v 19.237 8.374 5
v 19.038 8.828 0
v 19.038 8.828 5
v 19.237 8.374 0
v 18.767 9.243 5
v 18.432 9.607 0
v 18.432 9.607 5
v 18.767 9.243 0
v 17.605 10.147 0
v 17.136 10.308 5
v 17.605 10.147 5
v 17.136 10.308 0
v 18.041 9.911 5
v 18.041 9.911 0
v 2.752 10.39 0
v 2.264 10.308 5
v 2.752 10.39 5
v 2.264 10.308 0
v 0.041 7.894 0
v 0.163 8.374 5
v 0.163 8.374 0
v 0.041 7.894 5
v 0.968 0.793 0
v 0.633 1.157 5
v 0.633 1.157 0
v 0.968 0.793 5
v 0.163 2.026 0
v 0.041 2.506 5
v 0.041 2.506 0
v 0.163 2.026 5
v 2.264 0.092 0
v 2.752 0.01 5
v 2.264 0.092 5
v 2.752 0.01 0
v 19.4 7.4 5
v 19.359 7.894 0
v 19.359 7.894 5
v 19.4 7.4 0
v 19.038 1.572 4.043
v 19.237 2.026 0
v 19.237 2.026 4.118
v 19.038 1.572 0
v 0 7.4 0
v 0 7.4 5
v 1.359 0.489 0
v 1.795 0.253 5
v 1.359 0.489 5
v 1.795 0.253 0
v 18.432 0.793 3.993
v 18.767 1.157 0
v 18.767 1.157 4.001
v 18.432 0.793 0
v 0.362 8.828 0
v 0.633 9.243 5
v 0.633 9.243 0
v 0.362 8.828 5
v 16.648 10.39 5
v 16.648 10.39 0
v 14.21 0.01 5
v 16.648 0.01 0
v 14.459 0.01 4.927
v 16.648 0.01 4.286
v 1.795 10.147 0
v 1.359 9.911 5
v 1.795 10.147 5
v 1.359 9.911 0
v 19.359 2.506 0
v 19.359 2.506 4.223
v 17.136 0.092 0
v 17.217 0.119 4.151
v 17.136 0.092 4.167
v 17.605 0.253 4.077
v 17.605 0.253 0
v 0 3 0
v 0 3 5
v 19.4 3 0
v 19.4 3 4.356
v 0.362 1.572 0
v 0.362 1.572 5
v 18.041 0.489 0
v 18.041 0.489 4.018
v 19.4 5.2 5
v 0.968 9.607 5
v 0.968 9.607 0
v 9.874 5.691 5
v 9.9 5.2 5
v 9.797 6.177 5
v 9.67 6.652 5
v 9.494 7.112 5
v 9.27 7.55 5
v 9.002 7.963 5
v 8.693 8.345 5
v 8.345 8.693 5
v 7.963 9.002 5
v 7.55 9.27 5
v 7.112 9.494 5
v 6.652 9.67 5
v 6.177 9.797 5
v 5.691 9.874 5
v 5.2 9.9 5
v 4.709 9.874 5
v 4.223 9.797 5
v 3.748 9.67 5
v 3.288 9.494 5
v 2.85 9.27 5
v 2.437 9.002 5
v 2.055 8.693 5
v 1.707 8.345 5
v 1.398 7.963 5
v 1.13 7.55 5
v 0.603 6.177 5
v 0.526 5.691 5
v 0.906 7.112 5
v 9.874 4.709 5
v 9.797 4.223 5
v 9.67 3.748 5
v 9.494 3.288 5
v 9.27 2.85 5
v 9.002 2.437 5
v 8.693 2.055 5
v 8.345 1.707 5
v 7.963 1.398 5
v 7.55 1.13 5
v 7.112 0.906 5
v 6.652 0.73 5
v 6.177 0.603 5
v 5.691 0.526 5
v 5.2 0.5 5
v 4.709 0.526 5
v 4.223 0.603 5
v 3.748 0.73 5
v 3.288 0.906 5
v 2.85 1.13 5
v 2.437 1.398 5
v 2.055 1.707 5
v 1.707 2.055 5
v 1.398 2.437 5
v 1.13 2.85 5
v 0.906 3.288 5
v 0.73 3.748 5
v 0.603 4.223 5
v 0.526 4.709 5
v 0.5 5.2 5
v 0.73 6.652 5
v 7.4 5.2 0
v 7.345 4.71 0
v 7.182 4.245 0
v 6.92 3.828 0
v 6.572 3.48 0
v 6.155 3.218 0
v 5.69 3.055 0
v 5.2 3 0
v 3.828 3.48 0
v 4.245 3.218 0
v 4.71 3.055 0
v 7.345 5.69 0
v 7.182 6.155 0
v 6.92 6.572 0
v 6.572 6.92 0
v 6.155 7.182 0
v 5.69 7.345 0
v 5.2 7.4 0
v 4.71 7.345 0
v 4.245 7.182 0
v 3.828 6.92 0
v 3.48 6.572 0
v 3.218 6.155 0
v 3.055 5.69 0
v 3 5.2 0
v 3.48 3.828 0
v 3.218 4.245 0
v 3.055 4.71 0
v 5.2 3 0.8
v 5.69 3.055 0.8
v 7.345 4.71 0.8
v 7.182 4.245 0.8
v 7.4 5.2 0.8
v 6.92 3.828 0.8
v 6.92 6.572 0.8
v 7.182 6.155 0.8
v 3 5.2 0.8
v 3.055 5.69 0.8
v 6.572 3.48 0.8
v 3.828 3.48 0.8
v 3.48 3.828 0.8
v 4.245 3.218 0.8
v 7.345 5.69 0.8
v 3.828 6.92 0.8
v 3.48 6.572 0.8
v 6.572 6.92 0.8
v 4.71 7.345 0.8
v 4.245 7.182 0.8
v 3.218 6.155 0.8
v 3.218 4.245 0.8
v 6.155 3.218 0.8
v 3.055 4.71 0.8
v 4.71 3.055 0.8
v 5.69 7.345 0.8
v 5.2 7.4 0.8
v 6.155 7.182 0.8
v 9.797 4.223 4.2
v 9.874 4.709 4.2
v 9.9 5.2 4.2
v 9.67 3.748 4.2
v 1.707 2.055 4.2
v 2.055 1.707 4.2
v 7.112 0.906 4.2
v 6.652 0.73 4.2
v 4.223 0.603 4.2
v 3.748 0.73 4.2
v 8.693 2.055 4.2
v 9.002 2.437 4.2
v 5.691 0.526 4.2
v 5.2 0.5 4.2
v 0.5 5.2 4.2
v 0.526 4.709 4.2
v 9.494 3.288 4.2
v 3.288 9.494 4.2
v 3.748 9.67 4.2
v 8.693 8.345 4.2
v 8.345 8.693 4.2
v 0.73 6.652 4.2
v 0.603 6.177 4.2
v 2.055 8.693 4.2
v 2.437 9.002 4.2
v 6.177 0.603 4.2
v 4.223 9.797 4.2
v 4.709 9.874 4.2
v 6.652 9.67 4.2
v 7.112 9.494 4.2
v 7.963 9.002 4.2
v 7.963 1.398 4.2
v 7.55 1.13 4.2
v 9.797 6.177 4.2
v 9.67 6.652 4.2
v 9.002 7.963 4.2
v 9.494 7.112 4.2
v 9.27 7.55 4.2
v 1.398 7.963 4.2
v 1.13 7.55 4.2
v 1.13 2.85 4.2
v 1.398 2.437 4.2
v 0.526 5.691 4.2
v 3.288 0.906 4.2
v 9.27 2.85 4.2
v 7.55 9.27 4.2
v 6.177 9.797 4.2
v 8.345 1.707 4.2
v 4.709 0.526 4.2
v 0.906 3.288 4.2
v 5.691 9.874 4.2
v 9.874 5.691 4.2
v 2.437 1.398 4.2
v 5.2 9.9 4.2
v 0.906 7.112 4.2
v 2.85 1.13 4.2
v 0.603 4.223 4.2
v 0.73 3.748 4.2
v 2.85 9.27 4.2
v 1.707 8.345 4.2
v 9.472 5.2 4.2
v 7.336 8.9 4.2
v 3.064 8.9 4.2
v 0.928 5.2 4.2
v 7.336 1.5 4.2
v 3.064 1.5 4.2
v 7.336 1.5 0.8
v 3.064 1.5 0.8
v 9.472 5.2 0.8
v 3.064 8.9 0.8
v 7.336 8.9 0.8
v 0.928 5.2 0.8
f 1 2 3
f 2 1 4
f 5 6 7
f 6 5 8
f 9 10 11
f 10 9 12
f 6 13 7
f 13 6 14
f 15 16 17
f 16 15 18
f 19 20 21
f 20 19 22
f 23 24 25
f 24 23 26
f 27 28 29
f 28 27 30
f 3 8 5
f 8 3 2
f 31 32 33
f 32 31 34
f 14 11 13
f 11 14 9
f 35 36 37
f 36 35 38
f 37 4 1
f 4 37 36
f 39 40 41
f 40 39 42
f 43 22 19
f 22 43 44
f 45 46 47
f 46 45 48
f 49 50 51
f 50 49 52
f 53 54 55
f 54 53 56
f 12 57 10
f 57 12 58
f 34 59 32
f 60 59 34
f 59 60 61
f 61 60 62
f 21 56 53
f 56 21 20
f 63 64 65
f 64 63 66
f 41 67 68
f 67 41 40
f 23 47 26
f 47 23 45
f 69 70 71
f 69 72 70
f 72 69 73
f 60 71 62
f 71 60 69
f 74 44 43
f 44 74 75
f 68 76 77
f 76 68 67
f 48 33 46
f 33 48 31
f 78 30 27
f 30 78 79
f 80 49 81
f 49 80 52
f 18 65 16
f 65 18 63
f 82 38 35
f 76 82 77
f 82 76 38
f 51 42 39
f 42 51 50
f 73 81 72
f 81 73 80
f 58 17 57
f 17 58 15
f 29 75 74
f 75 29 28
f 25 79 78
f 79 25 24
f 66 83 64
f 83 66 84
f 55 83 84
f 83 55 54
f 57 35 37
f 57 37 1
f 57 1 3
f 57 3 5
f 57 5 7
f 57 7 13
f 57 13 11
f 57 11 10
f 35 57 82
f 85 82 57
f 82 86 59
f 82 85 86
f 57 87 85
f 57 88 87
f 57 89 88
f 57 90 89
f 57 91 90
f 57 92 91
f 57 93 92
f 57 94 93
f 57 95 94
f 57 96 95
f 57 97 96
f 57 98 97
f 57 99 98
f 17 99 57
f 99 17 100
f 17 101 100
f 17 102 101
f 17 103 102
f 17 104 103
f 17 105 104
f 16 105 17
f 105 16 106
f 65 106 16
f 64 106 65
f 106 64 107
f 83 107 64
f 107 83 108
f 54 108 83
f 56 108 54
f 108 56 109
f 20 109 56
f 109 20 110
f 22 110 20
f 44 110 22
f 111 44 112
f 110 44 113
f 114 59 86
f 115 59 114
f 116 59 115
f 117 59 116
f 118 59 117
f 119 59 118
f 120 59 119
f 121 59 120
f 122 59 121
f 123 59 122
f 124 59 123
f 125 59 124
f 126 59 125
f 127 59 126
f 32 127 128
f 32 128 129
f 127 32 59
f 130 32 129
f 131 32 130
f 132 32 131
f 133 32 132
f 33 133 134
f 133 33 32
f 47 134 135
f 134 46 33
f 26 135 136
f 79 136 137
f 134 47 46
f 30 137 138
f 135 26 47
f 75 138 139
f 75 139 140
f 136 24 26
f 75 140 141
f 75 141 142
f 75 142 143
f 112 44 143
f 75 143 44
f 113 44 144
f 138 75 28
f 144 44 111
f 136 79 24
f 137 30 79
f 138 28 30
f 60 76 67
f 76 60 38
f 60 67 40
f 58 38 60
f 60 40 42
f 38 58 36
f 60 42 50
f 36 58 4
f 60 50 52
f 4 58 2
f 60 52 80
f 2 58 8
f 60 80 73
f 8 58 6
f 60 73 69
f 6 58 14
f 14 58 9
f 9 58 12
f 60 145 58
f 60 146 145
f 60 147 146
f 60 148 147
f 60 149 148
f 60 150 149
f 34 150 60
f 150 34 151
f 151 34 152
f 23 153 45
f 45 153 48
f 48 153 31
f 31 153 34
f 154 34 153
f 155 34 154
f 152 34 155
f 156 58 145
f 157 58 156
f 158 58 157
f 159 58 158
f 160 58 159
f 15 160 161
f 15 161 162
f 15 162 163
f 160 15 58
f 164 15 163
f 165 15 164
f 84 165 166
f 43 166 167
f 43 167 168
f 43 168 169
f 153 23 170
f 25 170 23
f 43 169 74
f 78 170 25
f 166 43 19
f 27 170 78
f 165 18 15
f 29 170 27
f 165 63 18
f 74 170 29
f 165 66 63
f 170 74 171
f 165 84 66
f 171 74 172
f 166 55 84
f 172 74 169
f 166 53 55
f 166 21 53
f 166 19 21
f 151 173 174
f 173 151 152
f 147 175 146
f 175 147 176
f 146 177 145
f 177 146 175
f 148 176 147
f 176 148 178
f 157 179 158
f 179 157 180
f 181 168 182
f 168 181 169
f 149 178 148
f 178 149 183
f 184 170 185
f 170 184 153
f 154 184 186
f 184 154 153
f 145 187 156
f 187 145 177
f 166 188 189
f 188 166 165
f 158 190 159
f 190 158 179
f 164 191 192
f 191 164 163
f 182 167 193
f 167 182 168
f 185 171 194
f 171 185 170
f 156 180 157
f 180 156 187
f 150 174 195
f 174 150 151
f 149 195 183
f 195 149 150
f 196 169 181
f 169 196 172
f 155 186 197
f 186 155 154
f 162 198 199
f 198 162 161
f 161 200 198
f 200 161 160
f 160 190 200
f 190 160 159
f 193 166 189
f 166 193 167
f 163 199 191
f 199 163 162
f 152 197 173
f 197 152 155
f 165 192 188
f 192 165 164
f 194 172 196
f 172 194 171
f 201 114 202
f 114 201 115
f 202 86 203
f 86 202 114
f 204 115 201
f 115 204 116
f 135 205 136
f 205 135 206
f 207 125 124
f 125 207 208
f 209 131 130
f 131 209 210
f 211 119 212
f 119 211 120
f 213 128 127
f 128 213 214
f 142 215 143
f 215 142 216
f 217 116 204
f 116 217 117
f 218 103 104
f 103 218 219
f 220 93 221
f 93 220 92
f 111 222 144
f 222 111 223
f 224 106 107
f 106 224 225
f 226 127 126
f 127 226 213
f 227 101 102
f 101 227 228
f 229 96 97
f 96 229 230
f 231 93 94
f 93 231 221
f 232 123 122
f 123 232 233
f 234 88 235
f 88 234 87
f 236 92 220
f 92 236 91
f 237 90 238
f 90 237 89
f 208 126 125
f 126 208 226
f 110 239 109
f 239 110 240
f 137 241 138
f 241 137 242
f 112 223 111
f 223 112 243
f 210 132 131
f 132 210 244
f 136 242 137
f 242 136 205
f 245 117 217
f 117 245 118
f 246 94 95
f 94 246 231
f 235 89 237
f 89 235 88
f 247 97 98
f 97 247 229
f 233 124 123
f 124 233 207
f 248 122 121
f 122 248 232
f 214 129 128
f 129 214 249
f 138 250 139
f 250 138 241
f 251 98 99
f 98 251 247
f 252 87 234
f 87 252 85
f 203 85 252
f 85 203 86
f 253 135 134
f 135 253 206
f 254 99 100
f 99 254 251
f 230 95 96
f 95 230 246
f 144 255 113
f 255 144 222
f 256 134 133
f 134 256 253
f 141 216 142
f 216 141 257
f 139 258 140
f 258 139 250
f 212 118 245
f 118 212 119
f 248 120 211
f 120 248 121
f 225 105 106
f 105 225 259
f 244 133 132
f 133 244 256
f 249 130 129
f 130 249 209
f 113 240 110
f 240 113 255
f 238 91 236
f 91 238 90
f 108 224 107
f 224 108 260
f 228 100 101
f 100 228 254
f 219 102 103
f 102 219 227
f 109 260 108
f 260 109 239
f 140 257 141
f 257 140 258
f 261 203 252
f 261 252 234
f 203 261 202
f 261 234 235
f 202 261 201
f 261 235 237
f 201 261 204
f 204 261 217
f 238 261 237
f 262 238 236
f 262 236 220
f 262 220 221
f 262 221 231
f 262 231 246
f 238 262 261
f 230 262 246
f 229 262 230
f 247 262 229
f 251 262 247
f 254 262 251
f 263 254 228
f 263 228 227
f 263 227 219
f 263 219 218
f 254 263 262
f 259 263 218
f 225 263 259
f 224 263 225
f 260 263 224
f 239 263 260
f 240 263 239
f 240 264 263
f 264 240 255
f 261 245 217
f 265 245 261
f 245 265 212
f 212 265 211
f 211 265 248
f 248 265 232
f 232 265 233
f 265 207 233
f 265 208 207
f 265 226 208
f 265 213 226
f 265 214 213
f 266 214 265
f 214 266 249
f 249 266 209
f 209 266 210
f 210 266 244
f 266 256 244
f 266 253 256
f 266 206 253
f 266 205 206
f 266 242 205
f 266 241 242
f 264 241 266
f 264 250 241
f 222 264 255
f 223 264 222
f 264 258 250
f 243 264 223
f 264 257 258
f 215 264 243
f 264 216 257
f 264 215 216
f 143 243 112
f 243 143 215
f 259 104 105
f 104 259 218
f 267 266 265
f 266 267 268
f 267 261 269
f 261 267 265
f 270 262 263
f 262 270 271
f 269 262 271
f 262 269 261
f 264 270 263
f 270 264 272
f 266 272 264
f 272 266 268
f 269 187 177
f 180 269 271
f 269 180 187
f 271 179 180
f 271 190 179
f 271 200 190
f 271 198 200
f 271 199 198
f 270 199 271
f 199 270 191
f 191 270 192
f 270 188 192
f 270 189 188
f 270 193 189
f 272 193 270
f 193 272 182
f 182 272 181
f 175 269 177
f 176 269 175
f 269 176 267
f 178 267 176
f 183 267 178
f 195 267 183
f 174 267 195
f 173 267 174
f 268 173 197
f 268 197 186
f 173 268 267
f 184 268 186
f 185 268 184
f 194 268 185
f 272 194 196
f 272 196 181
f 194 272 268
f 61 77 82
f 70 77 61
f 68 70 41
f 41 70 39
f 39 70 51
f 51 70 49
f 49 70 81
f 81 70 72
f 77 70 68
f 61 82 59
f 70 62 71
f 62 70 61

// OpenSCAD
// file: functions.scad
/*******************************************************************

This OpenSCAD code and its rendered 3D model are part of the

	Kühling&Kühling RepRap Industrial 3D Printer


All details, BOM, assembling instructions and latest sources:
	http://kuehlingkuehling.de

Designed and developed by:
	Jonas Kühling <mail@jonaskuehling.de>
	Simon Kühling <mail@simonkuehling.de>

Licensed under:
	Creative Commons Attribution-ShareAlike
	CC BY-SA 3.0
	http://creativecommons.org/licenses/by-sa/3.0/

*******************************************************************/

module teardrop (r=4.5,h=20,alpha=45,teardropcorner=0,fulldrop=0){		// tear drop hole for top-centering
											// use teardropcorner=1 for bottom horizontal corners
	render()
	translate([-h/2,0,0])
		rotate([-270,0+(teardropcorner*180),90])
			difference(){
				linear_extrude(height=h){
					circle(r);
					polygon(points=[[0,0],[r*cos(alpha),r*sin(alpha)],[0,r/sin(alpha)],[-r*cos(alpha),r*sin(alpha)]], paths=[[0,1,2,3]]);
				}
				if(fulldrop==0) 
					translate([0,(r/sin(alpha))/2+r,h/2]) cube([2*r+2,r/sin(alpha),h+2],center=true);
			}
}

//teardrop(4.5,22,fulldrop=true);



module teardropcentering (r=4.5,h=20,alpha=45){				// tear drop hole for top-centering
	centering_offset_factor = 1.1;
	render()
	translate([-h/2,0,0])
		rotate([-270,0,90])
			difference(){
				linear_extrude(height=h){
					circle(r, $fn=24);
					polygon(points=[[0,0],[r*cos(alpha),r*sin(alpha)],[0,r/sin(alpha)],[-r*cos(alpha),r*sin(alpha)]], paths=[[0,1,2,3]]);
				}
				translate([0,(r/sin(alpha))/2+r*centering_offset_factor,h/2]) cube([2*r+2,r/sin(alpha),h+2],center=true);
			}
}

//teardropcentering();



module teardropcentering_half (r=4.5,h=20, bottom=0,alpha=45){				// tear drop hole for top-centering
																// upper half (bottom=0) or bottom half (bottom=1)
	centering_offset_factor = 1.2;
	render()
	translate([-h/2,0,0])
		rotate([-270,0,90])
			difference(){
				linear_extrude(height=h){
					circle(r, $fn=24);
					polygon(points=[[0,0],[r*cos(alpha),r*sin(alpha)],[0,r/sin(alpha)],[-r*cos(alpha),r*sin(alpha)]], paths=[[0,1,2,3]]);
				}
				translate([0,(r/sin(alpha))/2+r*centering_offset_factor,h/2]) cube([2*r+2,r/sin(alpha),h+2],center=true);
				translate([0,-(r*centering_offset_factor)/2-0.5+bottom*(r*centering_offset_factor+1),h/2]) cube([2*r+2,r*centering_offset_factor+1,h+2],center=true);
			}
}

//teardropcentering_half(bottom=0);


module polyhole(d,h){
	n = max(round(2 * d),3);
	cylinder(h = h, r = (d / 2) / cos (180 / n), $fn = n, center=true);
}



module roundcorner(radius,edge_length){
	render()
	translate([0,0,-1])
		difference(){
			translate([-1,-1,0])
				cube(size = [radius+1,radius+1,edge_length+2], center = false);
			translate(v = [radius,radius,-1])
				cylinder(h = edge_length+4, r=radius, center=false,$fs=0.1);
		}
}

//roundcorner(5,5);



module roundcorner_tear(radius,edge_length){
	render()
	difference(){
		translate([-1,-1,-1])
			cube(size = [edge_length+2, radius+1, radius+1], center = false);
		translate([(edge_length+4)/2-2, radius, radius])
			teardrop(radius, edge_length+4,teardropcorner=1);
	}
}

//roundcorner_tear(8,20);


module roundedge_tear(radius){
	render()
	difference(){
		translate([-1,-1,-1])
			cube(size = [radius+1, radius+1, radius+1], center = false);
		translate([radius,radius,radius])
			union(){
				sphere(r=radius, $fs=0.1);
				translate([0,0,-radius])
					cylinder(r1=(radius*sin(45))-(radius-(radius*sin(45))),r2=radius*sin(45),h=(radius-(radius*sin(45))), $fs=0.1);
			}
	}
}

//roundedge_tear(20);



module roundedge(radius){
	render()
	difference(){
		translate([-1,-1,-1])
			cube(size = [radius+1, radius+1, radius+1], center = false);
		translate([radius,radius,radius])
			sphere(r=radius, $fs=0.1);
	}
}

//roundedge(5);


module nut_trap(nut_wrench_size,trap_height,vertical=0, clearance=0.2,center=true){		// M3 wrench size = 5.5
	radius = cornerdiameter(nut_wrench_size+2*clearance) /2;
	rotate([0,vertical*90,0])
		cylinder(h = trap_height, r = radius, center=center, $fn = 6);
}

//nut_trap(5,5,0);

module nut_slot(nut_wrench_size,nut_height, nut_elevation,vertical=0, clearance=0.2){		// M3 wrench size = 5.5
	radius = cornerdiameter(nut_wrench_size+2*clearance) /2;
	slot_height = nut_height+2*clearance;
	slot_width = nut_wrench_size+2*clearance;
	rotate([0,vertical*270,0]){
		cylinder(h = slot_height, r = radius, center=true, $fn = 6);
		translate([0,-slot_width/2,-slot_height/2]) cube([nut_elevation+1,slot_width,slot_height]);
	}
}

//nut_slot(5.5,3,4,1);

function cornerdiameter(wrench_size) =  2* ((wrench_size)/2)/ cos(180/6);
function cornerdiameter_8(wrench_size) =  2* ((wrench_size)/2)/ cos(180/8);
// main file
/*******************************************************************

This OpenSCAD code and its rendered 3D model are part of the

	Kühling&Kühling RepRap Industrial 3D Printer


All details, BOM, assembling instructions and latest sources:
	http://kuehlingkuehling.de

Designed and developed by:
	Jonas Kühling <mail@jonaskuehling.de>
	Simon Kühling <mail@simonkuehling.de>

Licensed under:
	Creative Commons Attribution-ShareAlike
	CC BY-SA 3.0
	http://creativecommons.org/licenses/by-sa/3.0/

*******************************************************************/

include <configuration.scad>



// RENDER FOR PRINTING
// INNER PART BOTTOM
//rotate([-90,0,0]) translate([0,-frame_enclosure_door_lock_inside_body_width,0])
//frame_enclosure_door_lock_inside();

// INNER PART TOP
//mirror([0,1,0]) rotate([-90,0,0]) translate([0,-frame_enclosure_door_lock_inside_body_width,0])
//frame_enclosure_door_lock_inside();

// OUTER PART BOTTOM
//rotate([90,0,0])
//frame_enclosure_door_lock_outside();

// OUTER PART TOP
mirror([0,1,0]) rotate([90,0,0])
frame_enclosure_door_lock_outside();


module frame_enclosure_door_lock_inside(){
	difference(){

		// main body
		union(){
			hull(){
				translate([wall,frame_enclosure_door_lock_inside_body_width/2,wall])
					rotate([0,0,90])
						teardrop(wall,frame_enclosure_door_lock_inside_body_width);
				translate([wall,frame_enclosure_door_lock_inside_body_width/2,frame_enclosure_door_lock_inside_body_height-wall])
					rotate([180,0,90])
						teardrop(wall,frame_enclosure_door_lock_inside_body_width);
				translate([frame_enclosure_door_lock_inside_body_length-wall,frame_enclosure_door_lock_inside_body_width/2,wall])
					rotate([0,0,90])
						teardrop(wall,frame_enclosure_door_lock_inside_body_width);
				translate([frame_enclosure_door_lock_inside_body_length-wall,frame_enclosure_door_lock_inside_body_width/2,frame_enclosure_door_lock_inside_body_height-wall])
					rotate([180,0,90])
						teardrop(wall,frame_enclosure_door_lock_inside_body_width);
			}
		}

		// frame groove clearance
		translate([-1,-1,-1])
			cube([frame_enclosure_door_lock_inside_body_length+2,(frame_width/2-frame_enclosure_thickness-clearance)-(frame_groove_width/2-clearance)+1,frame_groove_depth-wall_thin+1]);

		// rotation clearance
		translate([(wall+clearance+frame_screw_dia/2)-(frame_enclosure_door_lock_inside_body_height-(frame_screw_dia/2+clearance+wall)-(frame_groove_depth-wall_thin)),(frame_width/2-frame_enclosure_thickness-clearance)-(frame_groove_width/2-clearance),frame_groove_depth-wall_thin])
			rotate([90,0,0])
				translate([0,0,1])
					roundcorner(frame_enclosure_door_lock_inside_body_height-(frame_screw_dia/2+clearance+wall)-(frame_groove_depth-wall_thin),frame_enclosure_door_lock_inside_body_width);
		translate([wall+clearance+frame_screw_dia/2-(frame_enclosure_door_lock_inside_body_height-wall-clearance-frame_screw_dia/2),frame_enclosure_door_lock_inside_body_width+1,0])
			rotate([90,0,0])
				translate([0,0,1])
					roundcorner(frame_enclosure_door_lock_inside_body_height-wall-clearance-frame_screw_dia/2,frame_enclosure_door_lock_inside_body_width);

		// lock bolt hole, washer countersink, nut trap
		translate([wall+clearance+frame_screw_dia/2,frame_enclosure_door_lock_inside_body_width/2,frame_enclosure_door_lock_inside_body_height-wall-clearance-frame_screw_dia/2])
			rotate([180,0,90])
				teardrop(frame_screw_dia/2+clearance,frame_enclosure_door_lock_inside_body_width+2,alpha=90);
		translate([wall+clearance+frame_screw_dia/2,-(frame_screw_washer_thickness+1)/2+frame_screw_washer_thickness,frame_enclosure_door_lock_inside_body_height-wall-clearance-frame_screw_dia/2])
			rotate([180,0,90])
				teardrop(frame_screw_washer_dia/2+clearance,frame_screw_washer_thickness+1,alpha=90);
		translate([wall+clearance+frame_screw_dia/2,-(frame_screw_nut_height+clearance+1)/2+frame_screw_washer_thickness+frame_screw_nut_height,frame_enclosure_door_lock_inside_body_height-wall-clearance-frame_screw_dia/2])
			rotate([90,0,0])
				nut_trap(frame_screw_nut_wrench, frame_screw_nut_height+clearance+1);
	}
}


module frame_enclosure_door_lock_outside(){
	difference(){

		// main body
		union(){
			hull(){
				translate([wall,frame_enclosure_door_lock_outside_body_width/2,wall])
					rotate([0,0,90])
						teardrop(wall,frame_enclosure_door_lock_outside_body_width);
				translate([wall,frame_enclosure_door_lock_outside_body_width/2,frame_enclosure_door_lock_outside_body_height-wall])
					rotate([180,0,90])
						teardrop(wall,frame_enclosure_door_lock_outside_body_width);
				translate([frame_enclosure_door_lock_outside_body_length-wall,frame_enclosure_door_lock_outside_body_width/2,wall])
					rotate([0,0,90])
						teardrop(wall,frame_enclosure_door_lock_outside_body_width);
				translate([frame_enclosure_door_lock_outside_body_length-wall,frame_enclosure_door_lock_outside_body_width/2,frame_enclosure_door_lock_outside_body_height-wall])
					rotate([180,0,90])
						teardrop(wall,frame_enclosure_door_lock_outside_body_width);
			}
		}


		// lock bolt hole, washer countersink, nut trap
		translate([wall+clearance+frame_screw_dia/2,-1,frame_enclosure_door_lock_outside_body_height/2])
			rotate([-90,0,0])
				cylinder(r=frame_screw_dia/2+clearance,h=frame_enclosure_door_lock_outside_body_width+2);
		translate([wall+clearance+frame_screw_dia/2,frame_enclosure_door_lock_outside_body_width-frame_screw_washer_thickness,frame_enclosure_door_lock_outside_body_height/2])
			rotate([-90,0,0])
				cylinder(r=frame_screw_washer_dia/2+clearance,h=frame_screw_washer_thickness+1);
		translate([wall+clearance+frame_screw_dia/2,(frame_screw_nut_height+clearance+1)/2+frame_enclosure_door_lock_outside_body_width-frame_screw_washer_thickness-frame_screw_nut_height-clearance,frame_enclosure_door_lock_outside_body_height/2])
			rotate([90,0,0])
				nut_trap(frame_screw_nut_wrench, frame_screw_nut_height+clearance+1);

		// bevel
		translate([frame_enclosure_door_lock_outside_body_length-frame_enclosure_door_lock_outside_body_height/2,frame_enclosure_door_lock_outside_body_width,0])
			rotate([0,-45,0])
			rotate([-45/2,0,0])
				rotate([0,0,90])
					translate([0,-frame_enclosure_door_lock_outside_body_length/2,-frame_enclosure_door_lock_outside_body_length/2])
						cube([wall,frame_enclosure_door_lock_outside_body_length,frame_enclosure_door_lock_outside_body_length]);

	}
}
